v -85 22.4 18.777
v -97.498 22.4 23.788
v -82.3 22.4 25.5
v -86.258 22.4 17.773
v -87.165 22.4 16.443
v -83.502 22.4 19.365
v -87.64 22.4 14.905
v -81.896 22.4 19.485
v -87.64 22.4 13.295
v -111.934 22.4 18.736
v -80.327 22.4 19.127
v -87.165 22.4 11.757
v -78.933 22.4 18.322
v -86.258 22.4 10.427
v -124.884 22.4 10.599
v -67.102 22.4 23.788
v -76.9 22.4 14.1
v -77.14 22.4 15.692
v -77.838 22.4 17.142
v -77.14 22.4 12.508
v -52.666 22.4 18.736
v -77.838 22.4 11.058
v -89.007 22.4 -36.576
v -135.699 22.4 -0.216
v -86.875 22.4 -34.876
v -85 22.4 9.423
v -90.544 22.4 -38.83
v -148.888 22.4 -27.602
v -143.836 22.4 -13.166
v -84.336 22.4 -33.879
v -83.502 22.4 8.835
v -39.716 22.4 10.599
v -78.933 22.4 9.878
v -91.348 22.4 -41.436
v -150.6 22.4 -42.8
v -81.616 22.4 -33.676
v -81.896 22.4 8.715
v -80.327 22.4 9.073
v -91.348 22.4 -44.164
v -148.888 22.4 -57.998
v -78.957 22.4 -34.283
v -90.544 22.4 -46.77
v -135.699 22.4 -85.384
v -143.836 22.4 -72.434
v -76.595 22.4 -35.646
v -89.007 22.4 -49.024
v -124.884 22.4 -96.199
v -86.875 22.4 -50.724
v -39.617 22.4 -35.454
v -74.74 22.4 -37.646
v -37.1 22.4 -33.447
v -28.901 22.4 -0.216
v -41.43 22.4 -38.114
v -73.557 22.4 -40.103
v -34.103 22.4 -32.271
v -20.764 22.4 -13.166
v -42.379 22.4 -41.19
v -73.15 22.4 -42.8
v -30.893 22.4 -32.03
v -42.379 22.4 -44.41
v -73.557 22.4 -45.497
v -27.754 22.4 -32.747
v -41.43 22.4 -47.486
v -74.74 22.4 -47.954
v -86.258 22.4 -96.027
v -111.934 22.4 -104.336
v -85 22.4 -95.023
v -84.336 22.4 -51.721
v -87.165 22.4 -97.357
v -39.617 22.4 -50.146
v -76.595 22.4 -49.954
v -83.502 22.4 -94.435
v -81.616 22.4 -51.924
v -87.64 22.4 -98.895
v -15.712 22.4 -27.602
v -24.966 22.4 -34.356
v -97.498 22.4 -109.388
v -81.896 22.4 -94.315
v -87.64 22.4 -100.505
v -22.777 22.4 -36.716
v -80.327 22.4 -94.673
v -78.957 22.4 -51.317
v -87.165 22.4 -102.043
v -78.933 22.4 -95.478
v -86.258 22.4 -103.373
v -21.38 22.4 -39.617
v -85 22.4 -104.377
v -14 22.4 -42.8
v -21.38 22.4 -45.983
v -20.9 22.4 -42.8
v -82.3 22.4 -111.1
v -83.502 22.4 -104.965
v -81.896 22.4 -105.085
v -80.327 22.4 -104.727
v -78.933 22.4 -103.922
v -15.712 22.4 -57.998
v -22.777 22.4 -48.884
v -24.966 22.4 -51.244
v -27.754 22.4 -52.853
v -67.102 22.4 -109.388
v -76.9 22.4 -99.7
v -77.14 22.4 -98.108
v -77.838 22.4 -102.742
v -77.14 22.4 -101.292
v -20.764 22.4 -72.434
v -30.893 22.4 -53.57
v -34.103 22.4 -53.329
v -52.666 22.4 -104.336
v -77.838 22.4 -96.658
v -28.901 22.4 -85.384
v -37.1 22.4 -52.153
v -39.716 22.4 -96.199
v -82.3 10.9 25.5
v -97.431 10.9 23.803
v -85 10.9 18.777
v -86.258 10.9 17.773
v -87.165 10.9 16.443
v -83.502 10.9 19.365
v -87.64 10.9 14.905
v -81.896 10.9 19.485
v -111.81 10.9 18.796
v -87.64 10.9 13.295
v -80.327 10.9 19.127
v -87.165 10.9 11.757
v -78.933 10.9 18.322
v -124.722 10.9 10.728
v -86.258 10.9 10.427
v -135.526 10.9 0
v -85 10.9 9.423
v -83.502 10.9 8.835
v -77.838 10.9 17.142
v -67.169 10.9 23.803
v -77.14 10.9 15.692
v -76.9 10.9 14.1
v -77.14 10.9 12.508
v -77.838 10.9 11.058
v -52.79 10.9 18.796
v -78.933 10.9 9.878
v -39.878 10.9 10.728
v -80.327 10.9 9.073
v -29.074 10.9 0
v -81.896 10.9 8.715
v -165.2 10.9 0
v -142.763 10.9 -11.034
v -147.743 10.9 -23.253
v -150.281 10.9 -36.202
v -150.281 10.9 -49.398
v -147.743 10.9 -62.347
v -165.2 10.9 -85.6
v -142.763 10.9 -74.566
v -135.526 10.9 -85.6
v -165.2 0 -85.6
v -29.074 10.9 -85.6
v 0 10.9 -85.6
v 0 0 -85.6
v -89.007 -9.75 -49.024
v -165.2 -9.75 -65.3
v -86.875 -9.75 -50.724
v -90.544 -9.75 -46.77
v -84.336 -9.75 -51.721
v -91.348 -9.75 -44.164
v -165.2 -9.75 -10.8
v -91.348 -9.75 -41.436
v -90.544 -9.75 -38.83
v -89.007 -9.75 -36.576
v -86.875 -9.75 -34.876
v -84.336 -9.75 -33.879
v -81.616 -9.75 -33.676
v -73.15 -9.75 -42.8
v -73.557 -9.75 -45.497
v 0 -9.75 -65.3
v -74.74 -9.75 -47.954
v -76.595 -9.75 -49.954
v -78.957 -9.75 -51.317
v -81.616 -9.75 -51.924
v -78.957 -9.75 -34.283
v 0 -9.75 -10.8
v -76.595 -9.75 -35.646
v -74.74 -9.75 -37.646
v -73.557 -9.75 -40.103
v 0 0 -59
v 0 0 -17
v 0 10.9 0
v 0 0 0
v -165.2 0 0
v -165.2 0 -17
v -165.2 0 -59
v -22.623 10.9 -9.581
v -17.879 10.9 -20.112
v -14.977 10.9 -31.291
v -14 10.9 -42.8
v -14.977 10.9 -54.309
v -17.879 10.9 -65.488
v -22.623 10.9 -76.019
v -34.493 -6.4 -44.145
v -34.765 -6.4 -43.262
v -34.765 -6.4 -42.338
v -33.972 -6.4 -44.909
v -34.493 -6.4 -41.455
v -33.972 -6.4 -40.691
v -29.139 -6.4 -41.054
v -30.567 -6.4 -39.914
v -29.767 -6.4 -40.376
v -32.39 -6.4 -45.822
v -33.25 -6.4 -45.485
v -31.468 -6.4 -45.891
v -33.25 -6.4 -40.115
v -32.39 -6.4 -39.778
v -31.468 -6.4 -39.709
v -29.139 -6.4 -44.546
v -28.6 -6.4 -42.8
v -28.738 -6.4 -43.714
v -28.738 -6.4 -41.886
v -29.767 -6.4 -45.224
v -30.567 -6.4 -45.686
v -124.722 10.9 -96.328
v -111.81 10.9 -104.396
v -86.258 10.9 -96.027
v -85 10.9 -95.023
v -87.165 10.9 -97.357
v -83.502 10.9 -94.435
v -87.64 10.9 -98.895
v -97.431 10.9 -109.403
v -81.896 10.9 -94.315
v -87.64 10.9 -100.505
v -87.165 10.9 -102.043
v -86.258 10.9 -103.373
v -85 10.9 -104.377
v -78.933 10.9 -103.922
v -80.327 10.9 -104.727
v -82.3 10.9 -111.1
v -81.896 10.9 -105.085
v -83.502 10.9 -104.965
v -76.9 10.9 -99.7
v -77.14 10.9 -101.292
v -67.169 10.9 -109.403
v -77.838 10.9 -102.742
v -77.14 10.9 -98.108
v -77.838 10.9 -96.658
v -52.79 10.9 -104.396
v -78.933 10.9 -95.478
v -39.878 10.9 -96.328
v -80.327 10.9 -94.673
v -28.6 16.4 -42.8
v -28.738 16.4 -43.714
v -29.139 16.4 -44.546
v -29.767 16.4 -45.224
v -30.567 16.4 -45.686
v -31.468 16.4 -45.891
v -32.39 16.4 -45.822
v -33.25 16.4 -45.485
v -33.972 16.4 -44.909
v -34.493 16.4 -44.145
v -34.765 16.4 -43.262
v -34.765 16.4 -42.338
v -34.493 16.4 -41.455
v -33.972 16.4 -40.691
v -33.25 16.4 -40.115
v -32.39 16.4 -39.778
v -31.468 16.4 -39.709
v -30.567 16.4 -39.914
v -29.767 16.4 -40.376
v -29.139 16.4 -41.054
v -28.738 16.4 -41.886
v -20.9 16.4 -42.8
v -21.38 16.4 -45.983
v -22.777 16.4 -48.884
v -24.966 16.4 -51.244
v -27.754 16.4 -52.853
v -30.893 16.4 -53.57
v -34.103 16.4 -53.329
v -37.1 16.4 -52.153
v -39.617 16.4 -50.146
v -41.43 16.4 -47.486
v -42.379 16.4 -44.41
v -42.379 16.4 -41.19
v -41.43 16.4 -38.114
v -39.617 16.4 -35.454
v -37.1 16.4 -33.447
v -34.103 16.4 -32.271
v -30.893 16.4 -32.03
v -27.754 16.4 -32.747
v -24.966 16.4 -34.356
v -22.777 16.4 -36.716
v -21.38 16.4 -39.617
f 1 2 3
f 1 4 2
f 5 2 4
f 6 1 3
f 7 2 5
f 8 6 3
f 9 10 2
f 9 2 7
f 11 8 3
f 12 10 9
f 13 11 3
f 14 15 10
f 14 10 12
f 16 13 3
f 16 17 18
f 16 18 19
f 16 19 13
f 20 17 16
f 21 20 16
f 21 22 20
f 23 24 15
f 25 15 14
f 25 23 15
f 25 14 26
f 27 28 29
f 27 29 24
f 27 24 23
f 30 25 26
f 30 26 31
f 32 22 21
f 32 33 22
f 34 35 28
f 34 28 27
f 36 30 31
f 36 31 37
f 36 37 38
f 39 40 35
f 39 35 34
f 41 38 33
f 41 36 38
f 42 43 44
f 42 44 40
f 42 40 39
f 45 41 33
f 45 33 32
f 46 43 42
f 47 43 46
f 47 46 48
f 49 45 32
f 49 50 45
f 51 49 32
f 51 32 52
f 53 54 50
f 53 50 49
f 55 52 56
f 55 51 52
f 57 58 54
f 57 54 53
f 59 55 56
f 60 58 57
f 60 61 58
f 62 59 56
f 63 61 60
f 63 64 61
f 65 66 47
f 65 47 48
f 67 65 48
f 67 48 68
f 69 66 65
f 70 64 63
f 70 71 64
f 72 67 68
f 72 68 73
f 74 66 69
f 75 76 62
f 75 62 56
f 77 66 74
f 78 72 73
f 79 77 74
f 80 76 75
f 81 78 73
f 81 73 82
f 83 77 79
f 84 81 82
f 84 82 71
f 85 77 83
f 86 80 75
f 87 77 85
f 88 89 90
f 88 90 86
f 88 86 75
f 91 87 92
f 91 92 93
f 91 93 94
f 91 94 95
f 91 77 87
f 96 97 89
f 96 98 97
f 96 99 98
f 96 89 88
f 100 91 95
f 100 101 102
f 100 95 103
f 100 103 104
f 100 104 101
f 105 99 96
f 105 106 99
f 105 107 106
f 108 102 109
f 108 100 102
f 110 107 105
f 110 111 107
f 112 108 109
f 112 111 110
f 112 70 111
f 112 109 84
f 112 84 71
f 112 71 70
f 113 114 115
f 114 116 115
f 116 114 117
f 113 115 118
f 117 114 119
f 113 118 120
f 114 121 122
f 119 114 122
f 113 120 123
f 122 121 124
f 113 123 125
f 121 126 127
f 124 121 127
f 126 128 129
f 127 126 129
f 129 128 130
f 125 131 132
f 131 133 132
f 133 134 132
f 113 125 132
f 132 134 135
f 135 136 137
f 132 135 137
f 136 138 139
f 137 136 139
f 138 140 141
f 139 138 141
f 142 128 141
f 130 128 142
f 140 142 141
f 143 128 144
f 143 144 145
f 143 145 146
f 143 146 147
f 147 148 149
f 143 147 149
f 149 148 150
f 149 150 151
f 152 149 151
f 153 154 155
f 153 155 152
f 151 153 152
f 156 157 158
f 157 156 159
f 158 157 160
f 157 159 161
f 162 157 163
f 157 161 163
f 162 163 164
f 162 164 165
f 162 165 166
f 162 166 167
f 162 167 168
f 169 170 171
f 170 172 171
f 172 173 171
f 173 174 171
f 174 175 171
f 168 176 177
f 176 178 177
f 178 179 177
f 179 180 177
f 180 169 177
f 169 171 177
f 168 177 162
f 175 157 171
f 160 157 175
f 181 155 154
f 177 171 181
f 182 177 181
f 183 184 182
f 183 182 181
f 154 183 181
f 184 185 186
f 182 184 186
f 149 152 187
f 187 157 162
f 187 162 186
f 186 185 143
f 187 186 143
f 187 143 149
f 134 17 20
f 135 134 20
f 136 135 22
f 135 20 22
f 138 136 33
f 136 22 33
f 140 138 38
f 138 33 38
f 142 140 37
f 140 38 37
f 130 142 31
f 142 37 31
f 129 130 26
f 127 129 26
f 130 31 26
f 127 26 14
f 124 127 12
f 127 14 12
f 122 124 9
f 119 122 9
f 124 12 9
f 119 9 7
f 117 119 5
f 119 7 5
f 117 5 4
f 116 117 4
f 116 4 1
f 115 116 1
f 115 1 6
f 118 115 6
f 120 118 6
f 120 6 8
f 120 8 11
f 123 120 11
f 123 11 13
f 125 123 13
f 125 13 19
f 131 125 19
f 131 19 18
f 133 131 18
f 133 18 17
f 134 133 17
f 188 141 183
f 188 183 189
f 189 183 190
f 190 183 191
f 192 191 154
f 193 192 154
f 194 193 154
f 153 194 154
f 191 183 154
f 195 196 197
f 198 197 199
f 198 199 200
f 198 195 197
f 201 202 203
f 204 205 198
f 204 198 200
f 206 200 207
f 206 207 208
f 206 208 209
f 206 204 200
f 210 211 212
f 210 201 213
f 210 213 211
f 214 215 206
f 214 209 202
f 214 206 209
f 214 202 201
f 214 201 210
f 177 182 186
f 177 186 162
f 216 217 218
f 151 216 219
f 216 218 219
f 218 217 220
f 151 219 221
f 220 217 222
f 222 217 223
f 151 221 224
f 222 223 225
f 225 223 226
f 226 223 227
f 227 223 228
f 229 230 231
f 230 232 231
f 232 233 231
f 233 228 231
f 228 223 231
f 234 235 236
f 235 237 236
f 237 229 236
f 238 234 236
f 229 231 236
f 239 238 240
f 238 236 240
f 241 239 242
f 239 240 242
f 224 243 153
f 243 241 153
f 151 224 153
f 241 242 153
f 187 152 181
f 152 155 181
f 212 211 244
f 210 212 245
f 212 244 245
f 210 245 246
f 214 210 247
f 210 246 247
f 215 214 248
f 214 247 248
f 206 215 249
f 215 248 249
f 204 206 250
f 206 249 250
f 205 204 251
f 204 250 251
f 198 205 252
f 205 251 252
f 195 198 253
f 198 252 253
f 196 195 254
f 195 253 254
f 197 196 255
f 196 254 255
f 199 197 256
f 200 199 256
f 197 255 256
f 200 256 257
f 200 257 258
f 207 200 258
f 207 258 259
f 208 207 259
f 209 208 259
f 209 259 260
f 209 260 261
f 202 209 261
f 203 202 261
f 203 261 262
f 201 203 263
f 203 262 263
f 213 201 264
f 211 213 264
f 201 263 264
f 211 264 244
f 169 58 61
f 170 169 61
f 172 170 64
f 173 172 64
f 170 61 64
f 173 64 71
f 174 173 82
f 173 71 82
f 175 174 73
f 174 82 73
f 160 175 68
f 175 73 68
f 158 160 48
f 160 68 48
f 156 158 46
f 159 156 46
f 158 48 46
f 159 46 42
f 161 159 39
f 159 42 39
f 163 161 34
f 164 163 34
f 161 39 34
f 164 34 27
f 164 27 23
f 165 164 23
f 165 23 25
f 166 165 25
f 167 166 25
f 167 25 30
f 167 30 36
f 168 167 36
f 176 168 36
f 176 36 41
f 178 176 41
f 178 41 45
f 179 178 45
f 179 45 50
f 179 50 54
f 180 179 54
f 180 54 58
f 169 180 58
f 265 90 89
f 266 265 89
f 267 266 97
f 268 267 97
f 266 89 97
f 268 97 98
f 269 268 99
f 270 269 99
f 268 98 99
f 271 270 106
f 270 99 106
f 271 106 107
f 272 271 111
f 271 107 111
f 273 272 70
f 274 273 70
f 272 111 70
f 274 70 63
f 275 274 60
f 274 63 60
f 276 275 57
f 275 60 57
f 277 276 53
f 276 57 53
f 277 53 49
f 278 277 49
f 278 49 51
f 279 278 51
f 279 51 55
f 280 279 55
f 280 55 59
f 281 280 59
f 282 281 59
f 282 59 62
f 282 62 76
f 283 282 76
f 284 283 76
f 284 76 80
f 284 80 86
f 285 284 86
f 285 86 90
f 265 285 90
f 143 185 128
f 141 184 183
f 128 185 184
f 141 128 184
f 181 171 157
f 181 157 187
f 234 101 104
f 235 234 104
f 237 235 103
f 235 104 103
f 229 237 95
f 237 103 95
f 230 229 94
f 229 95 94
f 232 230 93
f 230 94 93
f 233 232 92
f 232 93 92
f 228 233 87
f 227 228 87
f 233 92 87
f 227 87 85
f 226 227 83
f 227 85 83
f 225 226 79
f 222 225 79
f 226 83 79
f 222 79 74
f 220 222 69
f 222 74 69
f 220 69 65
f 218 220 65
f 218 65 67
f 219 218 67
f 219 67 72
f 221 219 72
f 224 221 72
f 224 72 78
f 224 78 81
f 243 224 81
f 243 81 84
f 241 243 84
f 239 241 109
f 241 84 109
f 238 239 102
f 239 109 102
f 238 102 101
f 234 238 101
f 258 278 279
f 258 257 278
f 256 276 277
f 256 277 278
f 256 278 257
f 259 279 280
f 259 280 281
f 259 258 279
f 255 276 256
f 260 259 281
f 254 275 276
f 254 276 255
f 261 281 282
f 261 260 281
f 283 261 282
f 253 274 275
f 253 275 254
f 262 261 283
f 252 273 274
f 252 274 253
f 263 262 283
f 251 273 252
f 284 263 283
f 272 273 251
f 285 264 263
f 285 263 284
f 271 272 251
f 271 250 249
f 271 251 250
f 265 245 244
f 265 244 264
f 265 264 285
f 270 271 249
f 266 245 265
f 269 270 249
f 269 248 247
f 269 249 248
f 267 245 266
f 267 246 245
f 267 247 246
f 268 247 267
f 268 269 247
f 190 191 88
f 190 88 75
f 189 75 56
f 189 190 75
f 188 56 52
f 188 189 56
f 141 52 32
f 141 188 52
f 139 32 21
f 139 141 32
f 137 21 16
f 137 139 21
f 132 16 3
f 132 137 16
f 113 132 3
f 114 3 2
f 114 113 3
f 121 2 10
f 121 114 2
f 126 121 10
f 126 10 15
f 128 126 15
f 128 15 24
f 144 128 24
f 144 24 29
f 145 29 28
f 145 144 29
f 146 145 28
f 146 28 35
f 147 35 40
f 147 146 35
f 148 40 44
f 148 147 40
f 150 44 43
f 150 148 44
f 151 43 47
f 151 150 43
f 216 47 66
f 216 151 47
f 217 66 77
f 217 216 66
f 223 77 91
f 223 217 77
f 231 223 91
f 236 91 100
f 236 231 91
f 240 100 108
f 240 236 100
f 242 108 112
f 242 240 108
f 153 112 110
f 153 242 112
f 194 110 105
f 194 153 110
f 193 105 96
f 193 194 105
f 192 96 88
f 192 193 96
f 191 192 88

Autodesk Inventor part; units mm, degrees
ref_plane "YZ Plane" through (0, 0, 0) normal (1, 0, 0) x (0, 1, 0)
ref_plane "XZ Plane" through (0, 0, 0) normal (0, 1, 0) x (-1, 0, 0)
ref_plane "XY Plane" through (0, 0, 0) normal (0, 0, 1) x (1, 0, 0)
sketch "Sketch1" plane through (0, 0, 0) normal (1, 0, 0) x (0, 1, 0)
  line L0 (0, 0) -> (10.9, 0)
  line L1 (10.9, 0) -> (10.9, -85.6)
  line L2 (10.9, -85.6) -> (0, -85.6)
  line L3 (0, -85.6) -> (0, -59)
  line L4 (-9.75, -85.6) -> (-9.75, -65.3)
  line L5 (-9.75, -65.3) -> (-9.75, -10.8)
  line L6 (-9.75, -65.3) -> (0, -59)
  line L7 (0, 0) -> (0, -17)
  line L8 (0, -17) -> (-9.75, -10.8)
  dimension "d1" = 85.6
  dimension "d2" = 26.6
  dimension "d5" = 20.3
  dimension "d6" = 54.5
  dimension "d7" = 17
extrude "Extrusion1" add sketch "Sketch1" against normal blind 165.2
sketch "Sketch2" plane through (0, 10.9, 0) normal (0, 1, 0) x (1, 0, 0)
  point P0 (0, 0)
sketch "Sketch3" plane through (0, 10.9, 0) normal (0, 1, 0) x (1, 0, 0)
  line L0 (0, 0) -> (0, 85.6) projected
  line L1 (0, 42.8) -> (-14, 42.8)
  line L2 (-14, 42.8) -> (-82.3, 42.8)
  circle A0 centre (-82.3, 42.8) radius 68.3
  dimension "d10" = 14
  dimension "d11" = 68.3
extrude "Extrusion2" add sketch "Sketch3" along normal blind 11.5
sketch "Sketch4" plane through (-82.3, 22.4, -42.8) normal (0, 1, 0) x (1, 0, 0)
  circle A0 centre (0, 0) radius 9.15
  point P0 (82.3, -42.8)
  dimension "d14" = 18.3
extrude "Extrusion3" cut sketch "Sketch4" against normal blind 73.75
sketch "Sketch5" plane through (-82.3, 22.4, -42.8) normal (0, 1, 0) x (1, 0, 0)
  circle A0 centre (0, 0) radius 68.3 projected
  line L0 (0, 68.3) -> (0, 62.3)
  line L1 (0, -68.3) -> (0, -62.3)
  line L2 (0, 62.3) -> (0, 56.9)
  circle A1 centre (0, 56.9) radius 5.4
  line L3 (0, -62.3) -> (0, -56.9)
  line L4 (82.3, -32) -> (-82.9, -32) projected
  circle A2 centre (0, -56.9) radius 5.4
  point P0 (82.3, -42.8)
  dimension "d17" = 6
  dimension "d18" = 6
  dimension "d19" = 5.4
  dimension "d20" = 5.4
extrude "Extrusion4" cut sketch "Sketch5" against normal blind 73.75 contours A1 | A2
sketch "Sketch6" plane through (-82.3, 22.4, -42.8) normal (0, 1, 0) x (1, 0, 0)
  point P0 (82.3, -42.8)
sketch "Sketch7" plane through (-82.3, 22.4, -42.8) normal (0, 1, 0) x (1, 0, 0)
  circle A0 centre (0, 0) radius 68.3 projected
  line L0 (68.3, 0) -> (61.4, 0)
  line L1 (61.4, 0) -> (50.6, 0)
  circle A1 centre (50.6, 0) radius 10.8
  point P0 (82.3, -42.8)
  dimension "d23" = 6.9
  dimension "d24" = 10.8
extrude "Extrusion5" cut sketch "Sketch7" against normal blind 6 contours A1
sketch "Sketch8" plane through (-31.7, 16.4, -42.8) normal (0, 1, 0) x (1, 0, 0)
  circle A0 centre (0, 0) radius 3.1
  point P0 (31.7, -42.8)
  dimension "d27" = 6.2
extrude "Extrusion6" cut sketch "Sketch8" against normal blind 22.8
properties part number "Top Part Tool bit"
